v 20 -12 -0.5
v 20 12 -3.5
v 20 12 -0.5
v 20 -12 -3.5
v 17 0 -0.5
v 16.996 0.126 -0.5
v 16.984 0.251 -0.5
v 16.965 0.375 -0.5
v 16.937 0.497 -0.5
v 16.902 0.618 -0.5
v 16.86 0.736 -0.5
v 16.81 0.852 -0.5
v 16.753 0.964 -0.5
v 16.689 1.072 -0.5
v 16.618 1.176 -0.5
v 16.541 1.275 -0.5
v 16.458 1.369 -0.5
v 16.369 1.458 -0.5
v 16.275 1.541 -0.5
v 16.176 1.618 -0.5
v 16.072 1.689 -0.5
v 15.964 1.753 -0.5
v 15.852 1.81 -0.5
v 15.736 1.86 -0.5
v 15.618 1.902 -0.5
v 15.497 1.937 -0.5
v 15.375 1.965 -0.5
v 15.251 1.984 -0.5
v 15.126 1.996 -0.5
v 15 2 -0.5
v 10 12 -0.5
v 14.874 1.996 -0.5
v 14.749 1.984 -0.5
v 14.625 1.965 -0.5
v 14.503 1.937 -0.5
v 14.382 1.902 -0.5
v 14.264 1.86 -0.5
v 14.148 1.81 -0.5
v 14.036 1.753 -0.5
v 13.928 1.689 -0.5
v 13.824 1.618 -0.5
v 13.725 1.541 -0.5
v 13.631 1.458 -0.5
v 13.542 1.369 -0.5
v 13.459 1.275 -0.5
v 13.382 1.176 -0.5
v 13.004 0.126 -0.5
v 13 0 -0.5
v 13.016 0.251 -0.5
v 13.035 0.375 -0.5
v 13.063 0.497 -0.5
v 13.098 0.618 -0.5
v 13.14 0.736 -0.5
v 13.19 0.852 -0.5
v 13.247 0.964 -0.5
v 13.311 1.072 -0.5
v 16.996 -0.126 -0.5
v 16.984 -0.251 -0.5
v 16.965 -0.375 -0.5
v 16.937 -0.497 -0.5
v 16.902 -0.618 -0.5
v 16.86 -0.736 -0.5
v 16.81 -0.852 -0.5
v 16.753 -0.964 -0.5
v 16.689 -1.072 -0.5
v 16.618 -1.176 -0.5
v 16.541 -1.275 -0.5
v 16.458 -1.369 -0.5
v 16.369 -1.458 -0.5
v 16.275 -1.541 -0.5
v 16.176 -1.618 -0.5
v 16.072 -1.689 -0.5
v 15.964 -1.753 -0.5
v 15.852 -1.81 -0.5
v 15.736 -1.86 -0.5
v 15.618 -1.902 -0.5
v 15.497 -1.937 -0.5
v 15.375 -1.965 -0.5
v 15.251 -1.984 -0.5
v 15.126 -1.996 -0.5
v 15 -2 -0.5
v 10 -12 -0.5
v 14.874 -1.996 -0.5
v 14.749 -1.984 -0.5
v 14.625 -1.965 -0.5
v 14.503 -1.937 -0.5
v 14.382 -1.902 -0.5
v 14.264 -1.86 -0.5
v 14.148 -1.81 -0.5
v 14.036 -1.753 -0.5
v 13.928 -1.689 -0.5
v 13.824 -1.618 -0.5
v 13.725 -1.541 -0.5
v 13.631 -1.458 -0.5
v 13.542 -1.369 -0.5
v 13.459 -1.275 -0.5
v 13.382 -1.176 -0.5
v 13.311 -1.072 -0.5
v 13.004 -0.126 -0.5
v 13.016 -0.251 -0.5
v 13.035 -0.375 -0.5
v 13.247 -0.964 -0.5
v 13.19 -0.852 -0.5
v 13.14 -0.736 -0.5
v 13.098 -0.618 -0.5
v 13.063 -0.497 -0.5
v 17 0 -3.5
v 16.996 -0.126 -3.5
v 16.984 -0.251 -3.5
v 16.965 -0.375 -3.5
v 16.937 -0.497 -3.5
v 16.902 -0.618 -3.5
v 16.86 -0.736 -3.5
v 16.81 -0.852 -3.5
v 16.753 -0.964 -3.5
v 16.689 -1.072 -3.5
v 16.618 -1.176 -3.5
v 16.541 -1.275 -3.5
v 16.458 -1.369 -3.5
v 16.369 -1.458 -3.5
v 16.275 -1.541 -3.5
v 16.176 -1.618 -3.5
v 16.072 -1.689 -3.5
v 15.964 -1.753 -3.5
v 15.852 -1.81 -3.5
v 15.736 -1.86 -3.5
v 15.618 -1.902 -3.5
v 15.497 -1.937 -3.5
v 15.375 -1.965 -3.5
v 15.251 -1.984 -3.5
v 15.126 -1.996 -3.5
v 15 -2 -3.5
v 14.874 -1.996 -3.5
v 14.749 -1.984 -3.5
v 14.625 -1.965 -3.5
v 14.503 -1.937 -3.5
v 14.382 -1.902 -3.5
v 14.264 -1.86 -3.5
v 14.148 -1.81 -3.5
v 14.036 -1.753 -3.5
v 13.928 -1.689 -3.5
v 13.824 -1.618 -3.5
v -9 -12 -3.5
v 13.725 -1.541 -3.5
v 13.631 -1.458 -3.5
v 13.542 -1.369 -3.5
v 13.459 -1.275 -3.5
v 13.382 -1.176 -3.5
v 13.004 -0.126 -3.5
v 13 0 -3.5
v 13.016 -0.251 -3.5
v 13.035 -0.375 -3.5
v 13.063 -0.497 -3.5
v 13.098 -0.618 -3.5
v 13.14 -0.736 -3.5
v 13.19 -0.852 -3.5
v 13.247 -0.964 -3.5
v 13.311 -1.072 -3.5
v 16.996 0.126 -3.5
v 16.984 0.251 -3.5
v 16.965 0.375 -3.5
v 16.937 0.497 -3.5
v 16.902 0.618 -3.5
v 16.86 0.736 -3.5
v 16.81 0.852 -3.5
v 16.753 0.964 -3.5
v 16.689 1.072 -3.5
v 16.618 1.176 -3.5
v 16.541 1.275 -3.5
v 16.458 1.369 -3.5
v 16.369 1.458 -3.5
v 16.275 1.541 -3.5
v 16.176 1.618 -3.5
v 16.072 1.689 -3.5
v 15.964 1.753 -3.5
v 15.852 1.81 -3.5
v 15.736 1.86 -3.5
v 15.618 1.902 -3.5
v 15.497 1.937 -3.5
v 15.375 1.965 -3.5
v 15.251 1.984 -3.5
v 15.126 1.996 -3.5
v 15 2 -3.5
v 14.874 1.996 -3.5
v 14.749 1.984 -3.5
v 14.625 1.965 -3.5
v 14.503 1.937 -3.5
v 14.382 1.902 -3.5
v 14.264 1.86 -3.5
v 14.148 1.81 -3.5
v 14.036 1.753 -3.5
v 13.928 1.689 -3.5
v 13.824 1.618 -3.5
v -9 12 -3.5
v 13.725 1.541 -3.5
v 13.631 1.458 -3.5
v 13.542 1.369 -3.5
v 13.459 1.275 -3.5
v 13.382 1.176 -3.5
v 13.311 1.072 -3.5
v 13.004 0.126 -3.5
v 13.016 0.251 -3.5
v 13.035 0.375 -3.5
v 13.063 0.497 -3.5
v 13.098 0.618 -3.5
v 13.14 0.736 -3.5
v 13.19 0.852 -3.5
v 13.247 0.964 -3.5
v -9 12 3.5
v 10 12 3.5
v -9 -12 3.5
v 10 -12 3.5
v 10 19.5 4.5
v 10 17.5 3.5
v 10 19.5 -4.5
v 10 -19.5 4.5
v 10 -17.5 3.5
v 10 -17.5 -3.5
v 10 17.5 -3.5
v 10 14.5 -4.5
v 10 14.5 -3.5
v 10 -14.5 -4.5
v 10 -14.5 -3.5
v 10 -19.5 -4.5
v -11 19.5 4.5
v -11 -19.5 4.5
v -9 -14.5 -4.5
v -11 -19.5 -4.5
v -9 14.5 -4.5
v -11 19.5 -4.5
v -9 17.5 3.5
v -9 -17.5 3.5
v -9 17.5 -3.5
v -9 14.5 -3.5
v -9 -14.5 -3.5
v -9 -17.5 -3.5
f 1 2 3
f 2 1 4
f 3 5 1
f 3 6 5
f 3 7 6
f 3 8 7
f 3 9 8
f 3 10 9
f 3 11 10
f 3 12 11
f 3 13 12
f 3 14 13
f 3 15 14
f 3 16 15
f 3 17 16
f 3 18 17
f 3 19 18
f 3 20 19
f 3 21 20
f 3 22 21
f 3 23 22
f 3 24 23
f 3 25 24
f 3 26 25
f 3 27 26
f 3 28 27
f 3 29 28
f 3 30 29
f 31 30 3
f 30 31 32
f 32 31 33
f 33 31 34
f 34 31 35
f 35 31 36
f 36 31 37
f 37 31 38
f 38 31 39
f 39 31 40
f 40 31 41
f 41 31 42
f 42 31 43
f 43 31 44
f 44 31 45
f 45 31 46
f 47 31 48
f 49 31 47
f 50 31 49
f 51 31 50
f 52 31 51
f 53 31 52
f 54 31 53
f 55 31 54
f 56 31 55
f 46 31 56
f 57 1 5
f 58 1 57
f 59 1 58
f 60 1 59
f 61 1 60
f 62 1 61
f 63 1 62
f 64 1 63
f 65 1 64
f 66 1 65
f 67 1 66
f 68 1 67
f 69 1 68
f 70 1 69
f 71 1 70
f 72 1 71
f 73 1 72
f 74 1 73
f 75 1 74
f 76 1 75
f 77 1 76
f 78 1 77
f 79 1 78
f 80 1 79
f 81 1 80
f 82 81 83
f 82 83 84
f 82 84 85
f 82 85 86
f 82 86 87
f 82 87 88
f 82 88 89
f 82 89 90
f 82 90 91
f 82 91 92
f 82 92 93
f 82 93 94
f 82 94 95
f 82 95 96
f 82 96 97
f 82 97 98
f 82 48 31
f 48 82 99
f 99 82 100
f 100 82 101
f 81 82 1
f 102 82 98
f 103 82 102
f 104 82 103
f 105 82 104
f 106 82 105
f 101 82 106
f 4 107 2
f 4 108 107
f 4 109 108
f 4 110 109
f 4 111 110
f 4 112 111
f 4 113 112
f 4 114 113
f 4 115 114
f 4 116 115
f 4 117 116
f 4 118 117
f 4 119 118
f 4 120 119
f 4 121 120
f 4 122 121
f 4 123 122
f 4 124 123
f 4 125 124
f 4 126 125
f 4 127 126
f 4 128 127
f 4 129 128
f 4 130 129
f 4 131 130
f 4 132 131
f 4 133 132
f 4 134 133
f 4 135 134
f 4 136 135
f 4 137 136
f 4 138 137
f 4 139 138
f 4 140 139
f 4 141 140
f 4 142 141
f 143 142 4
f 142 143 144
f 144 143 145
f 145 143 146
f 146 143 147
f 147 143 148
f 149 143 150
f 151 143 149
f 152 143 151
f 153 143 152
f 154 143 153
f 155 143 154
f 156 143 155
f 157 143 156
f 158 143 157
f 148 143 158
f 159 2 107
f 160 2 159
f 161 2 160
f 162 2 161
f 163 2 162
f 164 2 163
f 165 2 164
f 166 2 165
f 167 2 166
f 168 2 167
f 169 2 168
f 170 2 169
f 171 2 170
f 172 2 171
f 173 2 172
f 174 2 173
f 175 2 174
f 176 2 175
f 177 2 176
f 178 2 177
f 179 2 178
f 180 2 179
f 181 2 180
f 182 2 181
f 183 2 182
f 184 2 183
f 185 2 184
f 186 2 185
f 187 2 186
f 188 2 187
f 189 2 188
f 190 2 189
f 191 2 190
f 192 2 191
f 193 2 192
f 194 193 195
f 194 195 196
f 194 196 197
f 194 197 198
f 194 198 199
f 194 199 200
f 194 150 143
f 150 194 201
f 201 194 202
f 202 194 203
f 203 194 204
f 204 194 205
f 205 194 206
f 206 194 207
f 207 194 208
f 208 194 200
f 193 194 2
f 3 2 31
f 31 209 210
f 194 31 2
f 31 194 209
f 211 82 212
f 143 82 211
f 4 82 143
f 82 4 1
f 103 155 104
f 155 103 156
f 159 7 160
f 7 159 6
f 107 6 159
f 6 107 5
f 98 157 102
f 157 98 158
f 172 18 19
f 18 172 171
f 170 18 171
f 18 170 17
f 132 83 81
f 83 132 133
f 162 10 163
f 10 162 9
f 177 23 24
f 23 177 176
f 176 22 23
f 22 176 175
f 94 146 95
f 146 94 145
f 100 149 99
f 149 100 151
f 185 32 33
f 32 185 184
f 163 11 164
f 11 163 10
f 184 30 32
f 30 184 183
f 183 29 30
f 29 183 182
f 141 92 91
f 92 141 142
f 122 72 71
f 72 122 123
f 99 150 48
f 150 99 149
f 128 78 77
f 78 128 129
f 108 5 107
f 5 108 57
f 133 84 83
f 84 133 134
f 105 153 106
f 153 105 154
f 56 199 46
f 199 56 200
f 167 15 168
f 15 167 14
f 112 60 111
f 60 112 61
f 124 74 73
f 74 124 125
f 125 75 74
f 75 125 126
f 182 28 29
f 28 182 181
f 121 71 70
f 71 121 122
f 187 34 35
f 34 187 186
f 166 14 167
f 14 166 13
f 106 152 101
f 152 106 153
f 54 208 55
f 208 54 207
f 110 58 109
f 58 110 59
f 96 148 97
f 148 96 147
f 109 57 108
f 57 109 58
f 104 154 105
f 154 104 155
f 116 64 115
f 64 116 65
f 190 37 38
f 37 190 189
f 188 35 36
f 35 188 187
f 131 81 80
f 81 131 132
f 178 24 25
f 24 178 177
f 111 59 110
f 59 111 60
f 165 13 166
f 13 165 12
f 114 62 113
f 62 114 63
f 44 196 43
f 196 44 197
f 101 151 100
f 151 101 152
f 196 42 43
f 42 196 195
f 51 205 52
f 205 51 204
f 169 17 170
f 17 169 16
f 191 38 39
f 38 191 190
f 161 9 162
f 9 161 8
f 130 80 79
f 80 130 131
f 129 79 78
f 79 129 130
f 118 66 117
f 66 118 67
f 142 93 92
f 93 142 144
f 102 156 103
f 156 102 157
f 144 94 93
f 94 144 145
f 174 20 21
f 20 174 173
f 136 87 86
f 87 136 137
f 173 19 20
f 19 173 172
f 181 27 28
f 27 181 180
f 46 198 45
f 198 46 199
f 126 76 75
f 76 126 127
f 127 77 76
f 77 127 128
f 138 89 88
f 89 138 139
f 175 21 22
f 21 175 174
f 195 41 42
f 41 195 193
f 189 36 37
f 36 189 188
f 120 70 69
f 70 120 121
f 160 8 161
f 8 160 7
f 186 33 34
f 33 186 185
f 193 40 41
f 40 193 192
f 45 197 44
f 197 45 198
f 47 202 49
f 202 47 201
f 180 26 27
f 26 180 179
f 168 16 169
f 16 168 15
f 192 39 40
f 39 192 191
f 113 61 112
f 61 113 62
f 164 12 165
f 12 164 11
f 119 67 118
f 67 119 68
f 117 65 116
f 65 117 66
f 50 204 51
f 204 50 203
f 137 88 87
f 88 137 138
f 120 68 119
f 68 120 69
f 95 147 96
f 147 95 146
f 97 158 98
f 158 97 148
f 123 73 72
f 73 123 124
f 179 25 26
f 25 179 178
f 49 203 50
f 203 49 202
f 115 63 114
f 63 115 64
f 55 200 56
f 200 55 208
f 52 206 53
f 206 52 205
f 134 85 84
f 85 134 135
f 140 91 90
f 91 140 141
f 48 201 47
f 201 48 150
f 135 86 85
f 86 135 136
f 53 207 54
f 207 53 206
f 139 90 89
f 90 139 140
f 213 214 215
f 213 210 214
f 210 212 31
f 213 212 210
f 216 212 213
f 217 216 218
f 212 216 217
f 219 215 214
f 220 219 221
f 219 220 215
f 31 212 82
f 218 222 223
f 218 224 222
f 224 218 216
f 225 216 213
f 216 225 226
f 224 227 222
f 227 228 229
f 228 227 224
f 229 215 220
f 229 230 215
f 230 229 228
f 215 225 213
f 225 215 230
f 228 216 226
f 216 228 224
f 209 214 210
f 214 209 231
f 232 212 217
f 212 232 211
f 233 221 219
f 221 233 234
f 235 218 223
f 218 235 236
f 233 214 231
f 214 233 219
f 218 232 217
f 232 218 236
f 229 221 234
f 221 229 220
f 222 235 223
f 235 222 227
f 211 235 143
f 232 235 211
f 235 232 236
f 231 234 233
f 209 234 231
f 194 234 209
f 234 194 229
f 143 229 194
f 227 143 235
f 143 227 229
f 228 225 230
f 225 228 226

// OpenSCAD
/*
A end cap for 35mm din rail. intentionaly loose for poor cut tolerance
the mounting hole was intended to take a push in screw fitting to 
act like a set screw

min_height=7.52mm
width = 35 mm
railwidth = 5.1mm
inner = 24.4mm
rail_hole = 5.4mm
max_dist_zwichen_holes == 11.11mm
bogus_messy_end_length == 20mm
*/
$fn  = 100;
w=39;//35+4
h=9;
d = 20;
inner = 24;
deep = 5;
module hole() {
    cylinder(h = deep + 0.3, r = 2.0);
}
module body(){
union(){
difference(){

difference(){
cube([d,w,h], center = true);

cube([d,w-4,h-2], center = true);
}
translate([0,0,-2])cube([d,w-10,h-2], center = true);
}

cube([d,inner,h-2], center = true);
}
}

module clip(){
//clip
difference(){
translate([10,0,-2])cube([d,inner,3], center = true);
translate([15,0,-5])hole();
}}

//end_cap()
translate([-10,0,0])cube([d-18,w,h], center = true);

clip();
body();
